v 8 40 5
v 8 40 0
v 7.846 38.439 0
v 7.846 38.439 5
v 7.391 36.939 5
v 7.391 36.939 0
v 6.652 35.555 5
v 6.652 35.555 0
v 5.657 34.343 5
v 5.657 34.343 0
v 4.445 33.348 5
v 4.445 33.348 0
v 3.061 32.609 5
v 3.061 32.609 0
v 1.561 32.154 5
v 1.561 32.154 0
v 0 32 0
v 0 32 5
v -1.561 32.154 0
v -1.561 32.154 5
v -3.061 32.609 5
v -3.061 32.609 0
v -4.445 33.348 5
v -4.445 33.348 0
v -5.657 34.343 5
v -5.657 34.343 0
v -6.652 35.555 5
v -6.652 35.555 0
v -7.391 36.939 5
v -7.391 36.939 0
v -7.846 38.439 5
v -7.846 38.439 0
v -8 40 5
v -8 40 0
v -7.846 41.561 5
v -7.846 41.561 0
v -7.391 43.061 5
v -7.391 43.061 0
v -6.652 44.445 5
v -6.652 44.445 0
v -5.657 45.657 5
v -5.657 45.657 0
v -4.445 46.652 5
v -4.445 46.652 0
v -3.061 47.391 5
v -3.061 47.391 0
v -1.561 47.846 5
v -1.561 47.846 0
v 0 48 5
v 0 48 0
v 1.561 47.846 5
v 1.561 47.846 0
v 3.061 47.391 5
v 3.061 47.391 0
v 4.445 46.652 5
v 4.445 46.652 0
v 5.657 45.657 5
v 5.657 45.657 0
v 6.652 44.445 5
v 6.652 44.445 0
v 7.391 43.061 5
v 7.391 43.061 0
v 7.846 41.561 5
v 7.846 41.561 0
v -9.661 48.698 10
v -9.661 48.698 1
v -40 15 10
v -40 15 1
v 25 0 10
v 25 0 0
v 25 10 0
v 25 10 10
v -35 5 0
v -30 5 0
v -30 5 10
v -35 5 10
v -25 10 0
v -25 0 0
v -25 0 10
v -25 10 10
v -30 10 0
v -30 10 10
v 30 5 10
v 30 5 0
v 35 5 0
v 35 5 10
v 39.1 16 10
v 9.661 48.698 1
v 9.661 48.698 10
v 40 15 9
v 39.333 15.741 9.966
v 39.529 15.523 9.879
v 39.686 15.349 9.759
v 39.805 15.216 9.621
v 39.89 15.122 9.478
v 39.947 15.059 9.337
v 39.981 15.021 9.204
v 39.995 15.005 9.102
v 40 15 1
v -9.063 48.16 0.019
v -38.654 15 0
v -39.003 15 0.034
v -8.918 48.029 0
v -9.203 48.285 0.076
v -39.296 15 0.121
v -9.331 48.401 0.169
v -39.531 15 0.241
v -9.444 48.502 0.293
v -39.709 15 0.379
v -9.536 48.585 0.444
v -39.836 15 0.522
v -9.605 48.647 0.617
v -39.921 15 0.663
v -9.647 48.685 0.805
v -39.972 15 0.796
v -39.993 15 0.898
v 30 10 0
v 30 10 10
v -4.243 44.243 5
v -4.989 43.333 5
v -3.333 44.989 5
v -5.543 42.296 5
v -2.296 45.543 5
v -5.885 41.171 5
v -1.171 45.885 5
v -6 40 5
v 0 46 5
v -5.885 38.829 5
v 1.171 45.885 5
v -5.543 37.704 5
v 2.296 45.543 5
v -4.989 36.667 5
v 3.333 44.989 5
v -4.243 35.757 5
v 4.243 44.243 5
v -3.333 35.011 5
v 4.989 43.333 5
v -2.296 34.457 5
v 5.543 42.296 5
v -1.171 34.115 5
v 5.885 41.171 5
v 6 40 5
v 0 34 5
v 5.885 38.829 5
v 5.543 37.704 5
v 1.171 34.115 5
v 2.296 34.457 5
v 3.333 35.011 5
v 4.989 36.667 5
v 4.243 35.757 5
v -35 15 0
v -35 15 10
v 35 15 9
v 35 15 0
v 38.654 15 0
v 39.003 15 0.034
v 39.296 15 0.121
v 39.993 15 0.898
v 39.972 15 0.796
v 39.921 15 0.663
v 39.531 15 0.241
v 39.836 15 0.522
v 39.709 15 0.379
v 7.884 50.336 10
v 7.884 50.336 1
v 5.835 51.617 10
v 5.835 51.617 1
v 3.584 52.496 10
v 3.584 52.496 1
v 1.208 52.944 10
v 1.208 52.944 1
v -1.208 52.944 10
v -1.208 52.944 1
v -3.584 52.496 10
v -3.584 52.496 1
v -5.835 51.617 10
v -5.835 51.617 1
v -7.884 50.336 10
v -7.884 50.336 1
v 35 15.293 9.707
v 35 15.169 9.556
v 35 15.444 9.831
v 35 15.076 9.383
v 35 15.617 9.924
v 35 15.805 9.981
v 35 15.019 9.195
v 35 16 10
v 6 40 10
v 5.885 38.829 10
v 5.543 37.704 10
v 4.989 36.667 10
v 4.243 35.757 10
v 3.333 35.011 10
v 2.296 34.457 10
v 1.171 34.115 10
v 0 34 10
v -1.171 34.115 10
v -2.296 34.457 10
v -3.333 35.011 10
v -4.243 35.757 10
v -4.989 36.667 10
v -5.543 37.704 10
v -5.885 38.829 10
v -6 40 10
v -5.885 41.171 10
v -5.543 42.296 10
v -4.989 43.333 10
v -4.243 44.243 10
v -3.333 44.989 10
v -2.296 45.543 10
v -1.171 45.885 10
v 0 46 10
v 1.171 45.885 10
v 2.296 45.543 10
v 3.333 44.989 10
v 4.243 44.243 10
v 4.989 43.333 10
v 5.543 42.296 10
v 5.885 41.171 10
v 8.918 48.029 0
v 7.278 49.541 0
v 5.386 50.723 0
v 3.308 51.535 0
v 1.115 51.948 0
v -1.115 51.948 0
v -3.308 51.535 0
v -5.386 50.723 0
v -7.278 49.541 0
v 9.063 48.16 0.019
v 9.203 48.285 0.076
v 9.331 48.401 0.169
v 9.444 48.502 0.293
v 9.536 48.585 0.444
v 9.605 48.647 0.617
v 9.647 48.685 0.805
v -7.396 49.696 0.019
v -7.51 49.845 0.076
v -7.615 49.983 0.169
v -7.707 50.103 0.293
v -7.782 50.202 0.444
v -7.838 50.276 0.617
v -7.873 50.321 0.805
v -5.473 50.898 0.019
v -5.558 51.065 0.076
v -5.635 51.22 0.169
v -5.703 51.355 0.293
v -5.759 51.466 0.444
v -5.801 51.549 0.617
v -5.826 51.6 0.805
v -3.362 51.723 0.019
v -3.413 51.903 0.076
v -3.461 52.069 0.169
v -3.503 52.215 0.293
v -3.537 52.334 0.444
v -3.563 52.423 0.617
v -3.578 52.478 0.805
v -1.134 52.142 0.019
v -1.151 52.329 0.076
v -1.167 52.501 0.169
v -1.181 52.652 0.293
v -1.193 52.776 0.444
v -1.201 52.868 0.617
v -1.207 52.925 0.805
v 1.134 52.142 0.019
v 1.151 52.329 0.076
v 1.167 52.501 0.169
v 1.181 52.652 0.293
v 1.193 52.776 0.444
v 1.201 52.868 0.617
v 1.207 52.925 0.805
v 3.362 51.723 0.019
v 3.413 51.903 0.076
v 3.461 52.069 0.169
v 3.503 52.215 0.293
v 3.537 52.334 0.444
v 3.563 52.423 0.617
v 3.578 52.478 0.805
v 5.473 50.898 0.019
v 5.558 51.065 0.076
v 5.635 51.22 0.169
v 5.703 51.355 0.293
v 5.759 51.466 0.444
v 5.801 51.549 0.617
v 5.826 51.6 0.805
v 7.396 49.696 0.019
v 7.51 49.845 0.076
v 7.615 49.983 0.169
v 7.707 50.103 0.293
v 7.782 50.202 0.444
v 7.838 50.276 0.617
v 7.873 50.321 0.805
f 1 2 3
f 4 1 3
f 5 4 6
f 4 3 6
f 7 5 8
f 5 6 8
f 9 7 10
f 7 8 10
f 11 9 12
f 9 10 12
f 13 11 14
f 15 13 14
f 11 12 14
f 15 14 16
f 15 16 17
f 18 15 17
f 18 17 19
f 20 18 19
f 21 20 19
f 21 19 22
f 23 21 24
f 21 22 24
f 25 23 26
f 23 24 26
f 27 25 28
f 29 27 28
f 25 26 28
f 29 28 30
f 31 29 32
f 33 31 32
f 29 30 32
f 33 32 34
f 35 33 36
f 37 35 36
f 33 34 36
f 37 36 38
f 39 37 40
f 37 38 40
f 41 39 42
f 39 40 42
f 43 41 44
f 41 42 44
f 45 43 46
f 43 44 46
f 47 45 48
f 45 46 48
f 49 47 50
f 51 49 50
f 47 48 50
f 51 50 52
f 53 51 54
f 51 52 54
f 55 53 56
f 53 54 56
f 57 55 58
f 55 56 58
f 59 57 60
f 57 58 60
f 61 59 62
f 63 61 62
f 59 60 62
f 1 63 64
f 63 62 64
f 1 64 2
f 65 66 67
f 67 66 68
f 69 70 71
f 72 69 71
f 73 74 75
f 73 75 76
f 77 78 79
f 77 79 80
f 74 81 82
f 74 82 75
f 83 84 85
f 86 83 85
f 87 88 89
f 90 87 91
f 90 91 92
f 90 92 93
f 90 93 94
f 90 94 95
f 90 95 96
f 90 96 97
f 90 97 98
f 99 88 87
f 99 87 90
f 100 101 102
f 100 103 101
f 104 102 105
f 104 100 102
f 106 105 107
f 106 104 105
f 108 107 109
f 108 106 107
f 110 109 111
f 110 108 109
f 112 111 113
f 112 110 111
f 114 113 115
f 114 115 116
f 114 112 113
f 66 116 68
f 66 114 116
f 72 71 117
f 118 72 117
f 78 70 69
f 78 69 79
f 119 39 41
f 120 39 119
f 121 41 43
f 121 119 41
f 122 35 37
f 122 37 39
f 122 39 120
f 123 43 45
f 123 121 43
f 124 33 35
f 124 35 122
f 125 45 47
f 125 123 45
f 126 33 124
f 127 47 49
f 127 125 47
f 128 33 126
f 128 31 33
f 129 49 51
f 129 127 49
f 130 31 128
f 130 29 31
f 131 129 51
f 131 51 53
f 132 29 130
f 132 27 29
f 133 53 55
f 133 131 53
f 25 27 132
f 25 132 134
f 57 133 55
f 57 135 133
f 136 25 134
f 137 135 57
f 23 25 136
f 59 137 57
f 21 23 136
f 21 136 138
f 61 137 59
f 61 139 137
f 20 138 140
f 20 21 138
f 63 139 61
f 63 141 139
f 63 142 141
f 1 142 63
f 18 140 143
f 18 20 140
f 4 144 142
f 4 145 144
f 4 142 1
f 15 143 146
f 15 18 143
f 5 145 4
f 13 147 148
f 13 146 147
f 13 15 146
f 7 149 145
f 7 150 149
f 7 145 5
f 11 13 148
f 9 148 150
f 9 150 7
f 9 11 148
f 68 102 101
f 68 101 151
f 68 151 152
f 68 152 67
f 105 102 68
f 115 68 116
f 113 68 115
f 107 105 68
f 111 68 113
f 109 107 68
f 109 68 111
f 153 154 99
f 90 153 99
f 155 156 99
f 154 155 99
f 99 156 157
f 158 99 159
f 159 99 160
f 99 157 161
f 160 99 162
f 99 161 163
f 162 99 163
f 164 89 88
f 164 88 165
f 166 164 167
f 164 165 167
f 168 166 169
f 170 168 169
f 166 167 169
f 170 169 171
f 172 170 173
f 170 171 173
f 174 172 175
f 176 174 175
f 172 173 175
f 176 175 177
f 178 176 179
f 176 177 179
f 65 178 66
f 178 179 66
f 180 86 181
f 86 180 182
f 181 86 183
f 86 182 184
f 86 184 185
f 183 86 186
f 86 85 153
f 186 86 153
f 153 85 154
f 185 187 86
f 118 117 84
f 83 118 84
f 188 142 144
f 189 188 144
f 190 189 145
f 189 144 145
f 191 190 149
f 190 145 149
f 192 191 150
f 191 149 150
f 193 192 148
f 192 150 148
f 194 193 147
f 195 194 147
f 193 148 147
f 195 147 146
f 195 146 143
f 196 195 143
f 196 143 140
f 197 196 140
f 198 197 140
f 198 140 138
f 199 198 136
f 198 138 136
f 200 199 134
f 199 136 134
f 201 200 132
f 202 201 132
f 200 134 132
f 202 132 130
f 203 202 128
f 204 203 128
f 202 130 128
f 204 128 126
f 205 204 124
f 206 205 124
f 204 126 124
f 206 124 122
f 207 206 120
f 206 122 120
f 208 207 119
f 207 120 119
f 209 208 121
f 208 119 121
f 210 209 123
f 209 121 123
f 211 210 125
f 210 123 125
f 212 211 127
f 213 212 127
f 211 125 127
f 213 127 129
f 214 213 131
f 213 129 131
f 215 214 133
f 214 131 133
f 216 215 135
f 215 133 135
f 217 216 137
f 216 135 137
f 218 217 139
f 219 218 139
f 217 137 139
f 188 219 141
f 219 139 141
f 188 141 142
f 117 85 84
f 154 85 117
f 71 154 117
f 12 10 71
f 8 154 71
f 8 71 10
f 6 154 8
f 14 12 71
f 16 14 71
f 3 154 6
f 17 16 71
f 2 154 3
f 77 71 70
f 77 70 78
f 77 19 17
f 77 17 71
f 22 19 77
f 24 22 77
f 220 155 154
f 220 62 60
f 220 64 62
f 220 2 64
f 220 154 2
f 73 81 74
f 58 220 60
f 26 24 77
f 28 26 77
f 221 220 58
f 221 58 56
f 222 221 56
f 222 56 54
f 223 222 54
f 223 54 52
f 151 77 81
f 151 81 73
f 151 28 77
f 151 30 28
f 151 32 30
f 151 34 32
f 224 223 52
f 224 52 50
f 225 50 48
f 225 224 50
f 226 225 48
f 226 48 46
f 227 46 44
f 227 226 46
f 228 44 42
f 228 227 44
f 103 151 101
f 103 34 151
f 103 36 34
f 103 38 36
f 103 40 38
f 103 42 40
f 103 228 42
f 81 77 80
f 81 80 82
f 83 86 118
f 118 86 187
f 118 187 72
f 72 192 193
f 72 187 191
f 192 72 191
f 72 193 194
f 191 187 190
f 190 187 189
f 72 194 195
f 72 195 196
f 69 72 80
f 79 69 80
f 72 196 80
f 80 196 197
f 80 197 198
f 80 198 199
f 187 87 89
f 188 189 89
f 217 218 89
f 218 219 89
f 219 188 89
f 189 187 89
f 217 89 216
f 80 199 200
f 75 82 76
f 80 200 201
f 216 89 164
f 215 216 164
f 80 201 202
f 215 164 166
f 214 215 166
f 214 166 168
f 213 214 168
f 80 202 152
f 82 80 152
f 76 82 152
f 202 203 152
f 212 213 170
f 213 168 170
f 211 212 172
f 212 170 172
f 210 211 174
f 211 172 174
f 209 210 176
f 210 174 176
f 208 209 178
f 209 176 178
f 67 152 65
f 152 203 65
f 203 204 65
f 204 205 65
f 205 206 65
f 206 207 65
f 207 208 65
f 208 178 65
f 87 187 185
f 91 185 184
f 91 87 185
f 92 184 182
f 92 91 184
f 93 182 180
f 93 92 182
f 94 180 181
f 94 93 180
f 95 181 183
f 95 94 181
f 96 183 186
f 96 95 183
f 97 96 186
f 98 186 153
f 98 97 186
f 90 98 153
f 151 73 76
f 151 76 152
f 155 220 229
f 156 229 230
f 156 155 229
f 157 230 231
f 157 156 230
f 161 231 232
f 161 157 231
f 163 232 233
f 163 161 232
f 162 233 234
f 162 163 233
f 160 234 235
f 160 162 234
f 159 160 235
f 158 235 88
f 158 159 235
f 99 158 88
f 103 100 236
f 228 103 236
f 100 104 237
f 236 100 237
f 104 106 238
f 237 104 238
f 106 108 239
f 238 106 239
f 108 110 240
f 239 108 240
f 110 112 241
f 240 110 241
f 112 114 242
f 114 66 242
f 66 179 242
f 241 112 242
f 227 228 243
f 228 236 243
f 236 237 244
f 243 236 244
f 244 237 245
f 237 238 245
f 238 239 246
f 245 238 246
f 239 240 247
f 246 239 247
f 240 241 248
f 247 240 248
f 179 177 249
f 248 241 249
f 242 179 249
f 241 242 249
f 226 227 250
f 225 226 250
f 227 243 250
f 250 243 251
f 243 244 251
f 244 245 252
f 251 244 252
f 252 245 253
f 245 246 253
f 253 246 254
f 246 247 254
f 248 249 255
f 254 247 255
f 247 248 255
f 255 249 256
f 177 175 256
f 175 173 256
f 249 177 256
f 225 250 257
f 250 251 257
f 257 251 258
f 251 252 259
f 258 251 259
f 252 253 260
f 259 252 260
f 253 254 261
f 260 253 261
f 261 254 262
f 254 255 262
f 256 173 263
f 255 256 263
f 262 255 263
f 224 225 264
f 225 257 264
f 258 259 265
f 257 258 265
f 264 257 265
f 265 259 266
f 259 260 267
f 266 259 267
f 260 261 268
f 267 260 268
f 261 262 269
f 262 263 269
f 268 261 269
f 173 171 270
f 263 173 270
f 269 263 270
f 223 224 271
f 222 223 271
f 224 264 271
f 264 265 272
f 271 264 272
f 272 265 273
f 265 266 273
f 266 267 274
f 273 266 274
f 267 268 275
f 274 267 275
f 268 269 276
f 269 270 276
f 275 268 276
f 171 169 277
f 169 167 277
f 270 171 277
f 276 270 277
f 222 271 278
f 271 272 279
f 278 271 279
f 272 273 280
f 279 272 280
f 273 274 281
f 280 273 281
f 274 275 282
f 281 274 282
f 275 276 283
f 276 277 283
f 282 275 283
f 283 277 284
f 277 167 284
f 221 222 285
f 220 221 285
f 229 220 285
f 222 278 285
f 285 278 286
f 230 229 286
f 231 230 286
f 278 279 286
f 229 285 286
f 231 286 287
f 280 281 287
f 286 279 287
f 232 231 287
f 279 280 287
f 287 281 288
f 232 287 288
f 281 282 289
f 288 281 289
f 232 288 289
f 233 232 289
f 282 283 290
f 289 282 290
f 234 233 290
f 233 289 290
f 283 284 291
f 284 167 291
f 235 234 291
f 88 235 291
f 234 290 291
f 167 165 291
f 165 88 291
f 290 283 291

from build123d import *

# Parameters (mm, degrees)
PAD_DEPTH       = 10
SKETCH001_R     = 8
POCKET_DEPTH    = 5
SKETCH003_R     = 6
POCKET001_DEPTH = 5
POCKET002_DEPTH = 10
FILLET_R        = 1


with BuildPart() as part:
    # Sketch → Pad (new body)
    with BuildSketch(Plane.XY):
        with BuildLine():
            Line((40, 0), (-40, 0))
            Line((-40, 0), (-40, 15))
            Line((-9.661357, 48.698171), (-40, 15))
            ThreePointArc((9.661357, 48.698171), (0, 53), (-9.661357, 48.698171))
            Line((9.661357, 48.698171), (40, 15))
            Line((40, 0), (40, 15))
        make_face()
    extrude(amount=PAD_DEPTH)

    # Sketch001 (on Face7 of Pad) → Pocket (cut)
    with BuildSketch(Plane(origin=(0, 0, 0), x_dir=(1, 0, 0), z_dir=(0, 0, -1))):
        with Locations((0, -40)):
            Circle(SKETCH001_R)
    extrude(amount=-POCKET_DEPTH, mode=Mode.SUBTRACT)

    # Sketch003 (on Face10 of Pocket) → Pocket001 (cut)
    with BuildSketch(Plane(origin=(0, 0, 5), x_dir=(1, 0, 0), z_dir=(0, 0, -1))):
        with Locations((0, -40)):
            Circle(SKETCH003_R)
    extrude(amount=-POCKET001_DEPTH, mode=Mode.SUBTRACT)

    # Sketch002 (on Face4 of Pocket001) → Pocket002 (cut)
    with BuildSketch(Plane(origin=(0, 0, 0), x_dir=(1, 0, 0), z_dir=(0, 0, -1))):
        Polygon((-40, -15), (-40, 0), (-25, 0), (-25, -10), (-30, -10), (-30, -5), (-35, -5), (-35, -15), align=None)
        Polygon((40, -15), (40, 0), (25, 0), (25, -10), (30, -10), (30, -5), (35, -5), (35, -15), align=None)
    extrude(amount=-POCKET002_DEPTH, mode=Mode.SUBTRACT)

    # Fillet
    fillet_edges = [part.edges().sort_by_distance(p)[0] for p in [
        (37.5, 15, 10),
        (24.830678, 31.849086, 0),
    ]]
    fillet(fillet_edges, radius=FILLET_R)


solid = part.part
